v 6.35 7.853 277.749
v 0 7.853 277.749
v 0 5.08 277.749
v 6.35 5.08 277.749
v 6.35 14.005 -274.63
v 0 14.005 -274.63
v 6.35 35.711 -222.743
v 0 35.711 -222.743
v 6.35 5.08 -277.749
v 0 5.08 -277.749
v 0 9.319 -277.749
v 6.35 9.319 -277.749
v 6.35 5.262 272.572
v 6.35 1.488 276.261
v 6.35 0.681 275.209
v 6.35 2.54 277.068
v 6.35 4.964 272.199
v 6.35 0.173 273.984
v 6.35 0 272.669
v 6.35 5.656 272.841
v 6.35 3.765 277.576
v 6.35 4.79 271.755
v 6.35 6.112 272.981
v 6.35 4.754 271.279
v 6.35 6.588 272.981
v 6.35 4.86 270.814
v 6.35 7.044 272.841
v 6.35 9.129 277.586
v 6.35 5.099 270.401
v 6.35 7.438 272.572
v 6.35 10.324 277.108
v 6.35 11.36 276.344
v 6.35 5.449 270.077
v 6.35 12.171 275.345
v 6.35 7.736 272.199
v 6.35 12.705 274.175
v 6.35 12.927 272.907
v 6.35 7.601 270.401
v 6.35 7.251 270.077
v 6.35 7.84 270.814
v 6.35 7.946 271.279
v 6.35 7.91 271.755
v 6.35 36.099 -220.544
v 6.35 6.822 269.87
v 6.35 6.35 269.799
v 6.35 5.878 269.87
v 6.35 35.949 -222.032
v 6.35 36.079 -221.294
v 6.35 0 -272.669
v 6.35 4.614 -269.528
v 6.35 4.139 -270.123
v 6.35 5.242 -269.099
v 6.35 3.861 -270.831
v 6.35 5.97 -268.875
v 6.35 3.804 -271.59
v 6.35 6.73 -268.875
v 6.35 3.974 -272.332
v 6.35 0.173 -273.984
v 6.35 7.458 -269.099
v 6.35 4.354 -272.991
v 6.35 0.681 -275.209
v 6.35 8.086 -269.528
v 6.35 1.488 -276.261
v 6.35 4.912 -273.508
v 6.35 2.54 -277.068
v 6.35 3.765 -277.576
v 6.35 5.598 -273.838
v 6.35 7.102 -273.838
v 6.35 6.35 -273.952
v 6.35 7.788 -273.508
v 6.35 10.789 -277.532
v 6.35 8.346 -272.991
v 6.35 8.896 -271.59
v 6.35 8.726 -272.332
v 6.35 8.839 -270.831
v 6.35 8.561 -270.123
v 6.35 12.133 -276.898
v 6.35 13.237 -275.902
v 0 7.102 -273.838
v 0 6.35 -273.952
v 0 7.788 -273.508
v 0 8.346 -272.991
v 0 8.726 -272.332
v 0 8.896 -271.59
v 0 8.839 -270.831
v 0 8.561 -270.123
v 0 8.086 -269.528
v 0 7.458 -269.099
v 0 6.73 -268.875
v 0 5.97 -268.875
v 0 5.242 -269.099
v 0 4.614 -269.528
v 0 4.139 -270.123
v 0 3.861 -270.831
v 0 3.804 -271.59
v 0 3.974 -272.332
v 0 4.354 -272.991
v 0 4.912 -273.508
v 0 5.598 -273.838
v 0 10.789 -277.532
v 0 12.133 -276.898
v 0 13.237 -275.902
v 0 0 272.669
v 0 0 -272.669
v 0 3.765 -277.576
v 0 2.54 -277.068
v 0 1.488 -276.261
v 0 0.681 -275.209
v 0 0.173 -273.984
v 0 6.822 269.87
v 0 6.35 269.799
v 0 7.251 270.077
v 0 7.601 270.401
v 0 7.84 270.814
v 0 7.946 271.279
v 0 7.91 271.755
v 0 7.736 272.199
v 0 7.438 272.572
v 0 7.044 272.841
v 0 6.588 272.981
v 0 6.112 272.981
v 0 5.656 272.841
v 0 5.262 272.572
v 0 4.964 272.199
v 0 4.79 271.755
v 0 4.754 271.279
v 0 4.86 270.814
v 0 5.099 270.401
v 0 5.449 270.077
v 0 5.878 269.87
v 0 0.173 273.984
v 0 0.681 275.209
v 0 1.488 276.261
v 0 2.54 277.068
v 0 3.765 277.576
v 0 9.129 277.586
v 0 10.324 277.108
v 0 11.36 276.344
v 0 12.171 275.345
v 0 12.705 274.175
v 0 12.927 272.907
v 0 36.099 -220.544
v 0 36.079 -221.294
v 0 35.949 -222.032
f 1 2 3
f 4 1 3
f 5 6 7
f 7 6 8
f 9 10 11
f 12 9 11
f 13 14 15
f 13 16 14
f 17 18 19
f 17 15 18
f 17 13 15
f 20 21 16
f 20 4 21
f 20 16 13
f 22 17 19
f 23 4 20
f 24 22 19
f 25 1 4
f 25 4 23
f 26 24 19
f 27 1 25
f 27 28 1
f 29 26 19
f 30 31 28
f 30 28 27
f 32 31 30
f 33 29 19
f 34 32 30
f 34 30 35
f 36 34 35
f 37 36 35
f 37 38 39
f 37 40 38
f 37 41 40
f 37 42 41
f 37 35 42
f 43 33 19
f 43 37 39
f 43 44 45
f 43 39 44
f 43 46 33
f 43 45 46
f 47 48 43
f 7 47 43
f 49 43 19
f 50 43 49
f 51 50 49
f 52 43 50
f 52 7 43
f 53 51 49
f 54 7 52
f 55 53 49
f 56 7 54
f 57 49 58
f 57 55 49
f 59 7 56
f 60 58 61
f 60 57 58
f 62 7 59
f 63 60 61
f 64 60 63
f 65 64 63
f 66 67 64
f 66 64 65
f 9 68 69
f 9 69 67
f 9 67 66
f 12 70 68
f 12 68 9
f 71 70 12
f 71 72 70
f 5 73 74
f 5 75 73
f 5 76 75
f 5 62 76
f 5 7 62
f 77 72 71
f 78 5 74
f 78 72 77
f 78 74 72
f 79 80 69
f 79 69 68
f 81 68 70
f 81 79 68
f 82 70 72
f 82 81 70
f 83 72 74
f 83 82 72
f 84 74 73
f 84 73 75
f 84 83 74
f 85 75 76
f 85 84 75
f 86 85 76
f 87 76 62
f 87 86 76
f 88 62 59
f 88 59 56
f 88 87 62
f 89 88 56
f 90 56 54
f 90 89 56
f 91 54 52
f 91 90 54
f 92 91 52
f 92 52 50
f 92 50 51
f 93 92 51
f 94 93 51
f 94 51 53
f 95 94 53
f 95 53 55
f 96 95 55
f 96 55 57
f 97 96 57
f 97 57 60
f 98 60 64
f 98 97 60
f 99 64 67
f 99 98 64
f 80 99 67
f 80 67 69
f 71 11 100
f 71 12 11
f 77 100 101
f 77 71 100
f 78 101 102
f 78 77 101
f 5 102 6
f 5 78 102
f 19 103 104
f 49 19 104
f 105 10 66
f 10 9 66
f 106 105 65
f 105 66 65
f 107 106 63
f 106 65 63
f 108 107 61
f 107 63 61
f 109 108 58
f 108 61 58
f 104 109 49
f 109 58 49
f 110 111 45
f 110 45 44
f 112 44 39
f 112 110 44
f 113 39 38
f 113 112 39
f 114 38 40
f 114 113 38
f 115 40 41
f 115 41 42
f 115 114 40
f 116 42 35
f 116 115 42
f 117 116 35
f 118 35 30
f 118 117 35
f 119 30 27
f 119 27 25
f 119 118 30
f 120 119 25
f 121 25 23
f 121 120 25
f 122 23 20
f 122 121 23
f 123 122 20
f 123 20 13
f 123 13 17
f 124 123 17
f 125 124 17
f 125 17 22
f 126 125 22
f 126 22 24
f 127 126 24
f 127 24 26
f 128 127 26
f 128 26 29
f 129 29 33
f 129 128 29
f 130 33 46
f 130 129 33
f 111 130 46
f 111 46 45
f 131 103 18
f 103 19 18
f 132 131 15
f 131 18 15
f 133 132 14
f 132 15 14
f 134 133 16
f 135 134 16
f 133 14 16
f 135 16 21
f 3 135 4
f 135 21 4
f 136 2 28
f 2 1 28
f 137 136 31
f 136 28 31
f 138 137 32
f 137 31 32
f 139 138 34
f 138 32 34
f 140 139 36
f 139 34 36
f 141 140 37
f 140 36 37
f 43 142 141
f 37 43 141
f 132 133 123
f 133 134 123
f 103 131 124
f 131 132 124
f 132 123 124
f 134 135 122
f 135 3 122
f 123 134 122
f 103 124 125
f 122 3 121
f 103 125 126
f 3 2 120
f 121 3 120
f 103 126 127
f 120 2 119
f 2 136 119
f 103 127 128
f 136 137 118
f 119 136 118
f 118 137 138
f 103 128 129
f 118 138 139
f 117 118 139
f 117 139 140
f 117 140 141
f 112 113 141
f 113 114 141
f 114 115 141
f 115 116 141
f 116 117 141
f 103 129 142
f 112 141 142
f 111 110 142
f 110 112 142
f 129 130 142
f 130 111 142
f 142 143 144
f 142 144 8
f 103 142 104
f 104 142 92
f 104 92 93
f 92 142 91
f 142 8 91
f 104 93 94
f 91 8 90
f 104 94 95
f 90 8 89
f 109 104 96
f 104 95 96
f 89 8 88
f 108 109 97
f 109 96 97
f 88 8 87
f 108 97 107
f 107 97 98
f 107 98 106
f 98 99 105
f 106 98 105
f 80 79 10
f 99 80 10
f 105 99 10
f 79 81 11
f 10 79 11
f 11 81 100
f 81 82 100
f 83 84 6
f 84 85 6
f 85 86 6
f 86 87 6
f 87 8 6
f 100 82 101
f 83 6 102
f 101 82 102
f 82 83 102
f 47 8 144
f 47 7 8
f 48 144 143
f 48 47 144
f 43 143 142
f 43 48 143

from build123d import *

# Parameters (mm, degrees)
SKETCH3_R           = 1.6002
SKETCH3_R_2         = 2.5527
BOSS_EXTRUDE1_DEPTH = 6.35
FILLET1_R           = 5.08


with BuildPart() as part:
    # Sketch3 → Boss-Extrude1 (new body)
    with BuildSketch(Plane(origin=(0, 0, 0), x_dir=(0, 0, -1), z_dir=(1, 0, 0))):
        Polygon((-265.049, 0), (265.049, 0), (277.749, 0), (277.749, 12.7), (221.687563823, 36.153126397), (-277.749, 12.7), (-277.749, 0), align=None)
        with Locations((-271.399, 6.35)):
            Circle(SKETCH3_R, mode=Mode.SUBTRACT)
        with Locations((271.399, 6.35)):
            Circle(SKETCH3_R_2, mode=Mode.SUBTRACT)
    extrude(amount=BOSS_EXTRUDE1_DEPTH)

    # Fillet1
    fillet1_edges = [part.edges().sort_by_distance(p)[0] for p in [
        (3.175, 0, 277.749),
        (3.175, 12.7, 277.749),
        (3.175, 36.153126397, -221.687563823),
        (3.175, 12.7, -277.749),
        (3.175, 0, -277.749),
    ]]
    fillet(fillet1_edges, radius=FILLET1_R)


solid = part.part
